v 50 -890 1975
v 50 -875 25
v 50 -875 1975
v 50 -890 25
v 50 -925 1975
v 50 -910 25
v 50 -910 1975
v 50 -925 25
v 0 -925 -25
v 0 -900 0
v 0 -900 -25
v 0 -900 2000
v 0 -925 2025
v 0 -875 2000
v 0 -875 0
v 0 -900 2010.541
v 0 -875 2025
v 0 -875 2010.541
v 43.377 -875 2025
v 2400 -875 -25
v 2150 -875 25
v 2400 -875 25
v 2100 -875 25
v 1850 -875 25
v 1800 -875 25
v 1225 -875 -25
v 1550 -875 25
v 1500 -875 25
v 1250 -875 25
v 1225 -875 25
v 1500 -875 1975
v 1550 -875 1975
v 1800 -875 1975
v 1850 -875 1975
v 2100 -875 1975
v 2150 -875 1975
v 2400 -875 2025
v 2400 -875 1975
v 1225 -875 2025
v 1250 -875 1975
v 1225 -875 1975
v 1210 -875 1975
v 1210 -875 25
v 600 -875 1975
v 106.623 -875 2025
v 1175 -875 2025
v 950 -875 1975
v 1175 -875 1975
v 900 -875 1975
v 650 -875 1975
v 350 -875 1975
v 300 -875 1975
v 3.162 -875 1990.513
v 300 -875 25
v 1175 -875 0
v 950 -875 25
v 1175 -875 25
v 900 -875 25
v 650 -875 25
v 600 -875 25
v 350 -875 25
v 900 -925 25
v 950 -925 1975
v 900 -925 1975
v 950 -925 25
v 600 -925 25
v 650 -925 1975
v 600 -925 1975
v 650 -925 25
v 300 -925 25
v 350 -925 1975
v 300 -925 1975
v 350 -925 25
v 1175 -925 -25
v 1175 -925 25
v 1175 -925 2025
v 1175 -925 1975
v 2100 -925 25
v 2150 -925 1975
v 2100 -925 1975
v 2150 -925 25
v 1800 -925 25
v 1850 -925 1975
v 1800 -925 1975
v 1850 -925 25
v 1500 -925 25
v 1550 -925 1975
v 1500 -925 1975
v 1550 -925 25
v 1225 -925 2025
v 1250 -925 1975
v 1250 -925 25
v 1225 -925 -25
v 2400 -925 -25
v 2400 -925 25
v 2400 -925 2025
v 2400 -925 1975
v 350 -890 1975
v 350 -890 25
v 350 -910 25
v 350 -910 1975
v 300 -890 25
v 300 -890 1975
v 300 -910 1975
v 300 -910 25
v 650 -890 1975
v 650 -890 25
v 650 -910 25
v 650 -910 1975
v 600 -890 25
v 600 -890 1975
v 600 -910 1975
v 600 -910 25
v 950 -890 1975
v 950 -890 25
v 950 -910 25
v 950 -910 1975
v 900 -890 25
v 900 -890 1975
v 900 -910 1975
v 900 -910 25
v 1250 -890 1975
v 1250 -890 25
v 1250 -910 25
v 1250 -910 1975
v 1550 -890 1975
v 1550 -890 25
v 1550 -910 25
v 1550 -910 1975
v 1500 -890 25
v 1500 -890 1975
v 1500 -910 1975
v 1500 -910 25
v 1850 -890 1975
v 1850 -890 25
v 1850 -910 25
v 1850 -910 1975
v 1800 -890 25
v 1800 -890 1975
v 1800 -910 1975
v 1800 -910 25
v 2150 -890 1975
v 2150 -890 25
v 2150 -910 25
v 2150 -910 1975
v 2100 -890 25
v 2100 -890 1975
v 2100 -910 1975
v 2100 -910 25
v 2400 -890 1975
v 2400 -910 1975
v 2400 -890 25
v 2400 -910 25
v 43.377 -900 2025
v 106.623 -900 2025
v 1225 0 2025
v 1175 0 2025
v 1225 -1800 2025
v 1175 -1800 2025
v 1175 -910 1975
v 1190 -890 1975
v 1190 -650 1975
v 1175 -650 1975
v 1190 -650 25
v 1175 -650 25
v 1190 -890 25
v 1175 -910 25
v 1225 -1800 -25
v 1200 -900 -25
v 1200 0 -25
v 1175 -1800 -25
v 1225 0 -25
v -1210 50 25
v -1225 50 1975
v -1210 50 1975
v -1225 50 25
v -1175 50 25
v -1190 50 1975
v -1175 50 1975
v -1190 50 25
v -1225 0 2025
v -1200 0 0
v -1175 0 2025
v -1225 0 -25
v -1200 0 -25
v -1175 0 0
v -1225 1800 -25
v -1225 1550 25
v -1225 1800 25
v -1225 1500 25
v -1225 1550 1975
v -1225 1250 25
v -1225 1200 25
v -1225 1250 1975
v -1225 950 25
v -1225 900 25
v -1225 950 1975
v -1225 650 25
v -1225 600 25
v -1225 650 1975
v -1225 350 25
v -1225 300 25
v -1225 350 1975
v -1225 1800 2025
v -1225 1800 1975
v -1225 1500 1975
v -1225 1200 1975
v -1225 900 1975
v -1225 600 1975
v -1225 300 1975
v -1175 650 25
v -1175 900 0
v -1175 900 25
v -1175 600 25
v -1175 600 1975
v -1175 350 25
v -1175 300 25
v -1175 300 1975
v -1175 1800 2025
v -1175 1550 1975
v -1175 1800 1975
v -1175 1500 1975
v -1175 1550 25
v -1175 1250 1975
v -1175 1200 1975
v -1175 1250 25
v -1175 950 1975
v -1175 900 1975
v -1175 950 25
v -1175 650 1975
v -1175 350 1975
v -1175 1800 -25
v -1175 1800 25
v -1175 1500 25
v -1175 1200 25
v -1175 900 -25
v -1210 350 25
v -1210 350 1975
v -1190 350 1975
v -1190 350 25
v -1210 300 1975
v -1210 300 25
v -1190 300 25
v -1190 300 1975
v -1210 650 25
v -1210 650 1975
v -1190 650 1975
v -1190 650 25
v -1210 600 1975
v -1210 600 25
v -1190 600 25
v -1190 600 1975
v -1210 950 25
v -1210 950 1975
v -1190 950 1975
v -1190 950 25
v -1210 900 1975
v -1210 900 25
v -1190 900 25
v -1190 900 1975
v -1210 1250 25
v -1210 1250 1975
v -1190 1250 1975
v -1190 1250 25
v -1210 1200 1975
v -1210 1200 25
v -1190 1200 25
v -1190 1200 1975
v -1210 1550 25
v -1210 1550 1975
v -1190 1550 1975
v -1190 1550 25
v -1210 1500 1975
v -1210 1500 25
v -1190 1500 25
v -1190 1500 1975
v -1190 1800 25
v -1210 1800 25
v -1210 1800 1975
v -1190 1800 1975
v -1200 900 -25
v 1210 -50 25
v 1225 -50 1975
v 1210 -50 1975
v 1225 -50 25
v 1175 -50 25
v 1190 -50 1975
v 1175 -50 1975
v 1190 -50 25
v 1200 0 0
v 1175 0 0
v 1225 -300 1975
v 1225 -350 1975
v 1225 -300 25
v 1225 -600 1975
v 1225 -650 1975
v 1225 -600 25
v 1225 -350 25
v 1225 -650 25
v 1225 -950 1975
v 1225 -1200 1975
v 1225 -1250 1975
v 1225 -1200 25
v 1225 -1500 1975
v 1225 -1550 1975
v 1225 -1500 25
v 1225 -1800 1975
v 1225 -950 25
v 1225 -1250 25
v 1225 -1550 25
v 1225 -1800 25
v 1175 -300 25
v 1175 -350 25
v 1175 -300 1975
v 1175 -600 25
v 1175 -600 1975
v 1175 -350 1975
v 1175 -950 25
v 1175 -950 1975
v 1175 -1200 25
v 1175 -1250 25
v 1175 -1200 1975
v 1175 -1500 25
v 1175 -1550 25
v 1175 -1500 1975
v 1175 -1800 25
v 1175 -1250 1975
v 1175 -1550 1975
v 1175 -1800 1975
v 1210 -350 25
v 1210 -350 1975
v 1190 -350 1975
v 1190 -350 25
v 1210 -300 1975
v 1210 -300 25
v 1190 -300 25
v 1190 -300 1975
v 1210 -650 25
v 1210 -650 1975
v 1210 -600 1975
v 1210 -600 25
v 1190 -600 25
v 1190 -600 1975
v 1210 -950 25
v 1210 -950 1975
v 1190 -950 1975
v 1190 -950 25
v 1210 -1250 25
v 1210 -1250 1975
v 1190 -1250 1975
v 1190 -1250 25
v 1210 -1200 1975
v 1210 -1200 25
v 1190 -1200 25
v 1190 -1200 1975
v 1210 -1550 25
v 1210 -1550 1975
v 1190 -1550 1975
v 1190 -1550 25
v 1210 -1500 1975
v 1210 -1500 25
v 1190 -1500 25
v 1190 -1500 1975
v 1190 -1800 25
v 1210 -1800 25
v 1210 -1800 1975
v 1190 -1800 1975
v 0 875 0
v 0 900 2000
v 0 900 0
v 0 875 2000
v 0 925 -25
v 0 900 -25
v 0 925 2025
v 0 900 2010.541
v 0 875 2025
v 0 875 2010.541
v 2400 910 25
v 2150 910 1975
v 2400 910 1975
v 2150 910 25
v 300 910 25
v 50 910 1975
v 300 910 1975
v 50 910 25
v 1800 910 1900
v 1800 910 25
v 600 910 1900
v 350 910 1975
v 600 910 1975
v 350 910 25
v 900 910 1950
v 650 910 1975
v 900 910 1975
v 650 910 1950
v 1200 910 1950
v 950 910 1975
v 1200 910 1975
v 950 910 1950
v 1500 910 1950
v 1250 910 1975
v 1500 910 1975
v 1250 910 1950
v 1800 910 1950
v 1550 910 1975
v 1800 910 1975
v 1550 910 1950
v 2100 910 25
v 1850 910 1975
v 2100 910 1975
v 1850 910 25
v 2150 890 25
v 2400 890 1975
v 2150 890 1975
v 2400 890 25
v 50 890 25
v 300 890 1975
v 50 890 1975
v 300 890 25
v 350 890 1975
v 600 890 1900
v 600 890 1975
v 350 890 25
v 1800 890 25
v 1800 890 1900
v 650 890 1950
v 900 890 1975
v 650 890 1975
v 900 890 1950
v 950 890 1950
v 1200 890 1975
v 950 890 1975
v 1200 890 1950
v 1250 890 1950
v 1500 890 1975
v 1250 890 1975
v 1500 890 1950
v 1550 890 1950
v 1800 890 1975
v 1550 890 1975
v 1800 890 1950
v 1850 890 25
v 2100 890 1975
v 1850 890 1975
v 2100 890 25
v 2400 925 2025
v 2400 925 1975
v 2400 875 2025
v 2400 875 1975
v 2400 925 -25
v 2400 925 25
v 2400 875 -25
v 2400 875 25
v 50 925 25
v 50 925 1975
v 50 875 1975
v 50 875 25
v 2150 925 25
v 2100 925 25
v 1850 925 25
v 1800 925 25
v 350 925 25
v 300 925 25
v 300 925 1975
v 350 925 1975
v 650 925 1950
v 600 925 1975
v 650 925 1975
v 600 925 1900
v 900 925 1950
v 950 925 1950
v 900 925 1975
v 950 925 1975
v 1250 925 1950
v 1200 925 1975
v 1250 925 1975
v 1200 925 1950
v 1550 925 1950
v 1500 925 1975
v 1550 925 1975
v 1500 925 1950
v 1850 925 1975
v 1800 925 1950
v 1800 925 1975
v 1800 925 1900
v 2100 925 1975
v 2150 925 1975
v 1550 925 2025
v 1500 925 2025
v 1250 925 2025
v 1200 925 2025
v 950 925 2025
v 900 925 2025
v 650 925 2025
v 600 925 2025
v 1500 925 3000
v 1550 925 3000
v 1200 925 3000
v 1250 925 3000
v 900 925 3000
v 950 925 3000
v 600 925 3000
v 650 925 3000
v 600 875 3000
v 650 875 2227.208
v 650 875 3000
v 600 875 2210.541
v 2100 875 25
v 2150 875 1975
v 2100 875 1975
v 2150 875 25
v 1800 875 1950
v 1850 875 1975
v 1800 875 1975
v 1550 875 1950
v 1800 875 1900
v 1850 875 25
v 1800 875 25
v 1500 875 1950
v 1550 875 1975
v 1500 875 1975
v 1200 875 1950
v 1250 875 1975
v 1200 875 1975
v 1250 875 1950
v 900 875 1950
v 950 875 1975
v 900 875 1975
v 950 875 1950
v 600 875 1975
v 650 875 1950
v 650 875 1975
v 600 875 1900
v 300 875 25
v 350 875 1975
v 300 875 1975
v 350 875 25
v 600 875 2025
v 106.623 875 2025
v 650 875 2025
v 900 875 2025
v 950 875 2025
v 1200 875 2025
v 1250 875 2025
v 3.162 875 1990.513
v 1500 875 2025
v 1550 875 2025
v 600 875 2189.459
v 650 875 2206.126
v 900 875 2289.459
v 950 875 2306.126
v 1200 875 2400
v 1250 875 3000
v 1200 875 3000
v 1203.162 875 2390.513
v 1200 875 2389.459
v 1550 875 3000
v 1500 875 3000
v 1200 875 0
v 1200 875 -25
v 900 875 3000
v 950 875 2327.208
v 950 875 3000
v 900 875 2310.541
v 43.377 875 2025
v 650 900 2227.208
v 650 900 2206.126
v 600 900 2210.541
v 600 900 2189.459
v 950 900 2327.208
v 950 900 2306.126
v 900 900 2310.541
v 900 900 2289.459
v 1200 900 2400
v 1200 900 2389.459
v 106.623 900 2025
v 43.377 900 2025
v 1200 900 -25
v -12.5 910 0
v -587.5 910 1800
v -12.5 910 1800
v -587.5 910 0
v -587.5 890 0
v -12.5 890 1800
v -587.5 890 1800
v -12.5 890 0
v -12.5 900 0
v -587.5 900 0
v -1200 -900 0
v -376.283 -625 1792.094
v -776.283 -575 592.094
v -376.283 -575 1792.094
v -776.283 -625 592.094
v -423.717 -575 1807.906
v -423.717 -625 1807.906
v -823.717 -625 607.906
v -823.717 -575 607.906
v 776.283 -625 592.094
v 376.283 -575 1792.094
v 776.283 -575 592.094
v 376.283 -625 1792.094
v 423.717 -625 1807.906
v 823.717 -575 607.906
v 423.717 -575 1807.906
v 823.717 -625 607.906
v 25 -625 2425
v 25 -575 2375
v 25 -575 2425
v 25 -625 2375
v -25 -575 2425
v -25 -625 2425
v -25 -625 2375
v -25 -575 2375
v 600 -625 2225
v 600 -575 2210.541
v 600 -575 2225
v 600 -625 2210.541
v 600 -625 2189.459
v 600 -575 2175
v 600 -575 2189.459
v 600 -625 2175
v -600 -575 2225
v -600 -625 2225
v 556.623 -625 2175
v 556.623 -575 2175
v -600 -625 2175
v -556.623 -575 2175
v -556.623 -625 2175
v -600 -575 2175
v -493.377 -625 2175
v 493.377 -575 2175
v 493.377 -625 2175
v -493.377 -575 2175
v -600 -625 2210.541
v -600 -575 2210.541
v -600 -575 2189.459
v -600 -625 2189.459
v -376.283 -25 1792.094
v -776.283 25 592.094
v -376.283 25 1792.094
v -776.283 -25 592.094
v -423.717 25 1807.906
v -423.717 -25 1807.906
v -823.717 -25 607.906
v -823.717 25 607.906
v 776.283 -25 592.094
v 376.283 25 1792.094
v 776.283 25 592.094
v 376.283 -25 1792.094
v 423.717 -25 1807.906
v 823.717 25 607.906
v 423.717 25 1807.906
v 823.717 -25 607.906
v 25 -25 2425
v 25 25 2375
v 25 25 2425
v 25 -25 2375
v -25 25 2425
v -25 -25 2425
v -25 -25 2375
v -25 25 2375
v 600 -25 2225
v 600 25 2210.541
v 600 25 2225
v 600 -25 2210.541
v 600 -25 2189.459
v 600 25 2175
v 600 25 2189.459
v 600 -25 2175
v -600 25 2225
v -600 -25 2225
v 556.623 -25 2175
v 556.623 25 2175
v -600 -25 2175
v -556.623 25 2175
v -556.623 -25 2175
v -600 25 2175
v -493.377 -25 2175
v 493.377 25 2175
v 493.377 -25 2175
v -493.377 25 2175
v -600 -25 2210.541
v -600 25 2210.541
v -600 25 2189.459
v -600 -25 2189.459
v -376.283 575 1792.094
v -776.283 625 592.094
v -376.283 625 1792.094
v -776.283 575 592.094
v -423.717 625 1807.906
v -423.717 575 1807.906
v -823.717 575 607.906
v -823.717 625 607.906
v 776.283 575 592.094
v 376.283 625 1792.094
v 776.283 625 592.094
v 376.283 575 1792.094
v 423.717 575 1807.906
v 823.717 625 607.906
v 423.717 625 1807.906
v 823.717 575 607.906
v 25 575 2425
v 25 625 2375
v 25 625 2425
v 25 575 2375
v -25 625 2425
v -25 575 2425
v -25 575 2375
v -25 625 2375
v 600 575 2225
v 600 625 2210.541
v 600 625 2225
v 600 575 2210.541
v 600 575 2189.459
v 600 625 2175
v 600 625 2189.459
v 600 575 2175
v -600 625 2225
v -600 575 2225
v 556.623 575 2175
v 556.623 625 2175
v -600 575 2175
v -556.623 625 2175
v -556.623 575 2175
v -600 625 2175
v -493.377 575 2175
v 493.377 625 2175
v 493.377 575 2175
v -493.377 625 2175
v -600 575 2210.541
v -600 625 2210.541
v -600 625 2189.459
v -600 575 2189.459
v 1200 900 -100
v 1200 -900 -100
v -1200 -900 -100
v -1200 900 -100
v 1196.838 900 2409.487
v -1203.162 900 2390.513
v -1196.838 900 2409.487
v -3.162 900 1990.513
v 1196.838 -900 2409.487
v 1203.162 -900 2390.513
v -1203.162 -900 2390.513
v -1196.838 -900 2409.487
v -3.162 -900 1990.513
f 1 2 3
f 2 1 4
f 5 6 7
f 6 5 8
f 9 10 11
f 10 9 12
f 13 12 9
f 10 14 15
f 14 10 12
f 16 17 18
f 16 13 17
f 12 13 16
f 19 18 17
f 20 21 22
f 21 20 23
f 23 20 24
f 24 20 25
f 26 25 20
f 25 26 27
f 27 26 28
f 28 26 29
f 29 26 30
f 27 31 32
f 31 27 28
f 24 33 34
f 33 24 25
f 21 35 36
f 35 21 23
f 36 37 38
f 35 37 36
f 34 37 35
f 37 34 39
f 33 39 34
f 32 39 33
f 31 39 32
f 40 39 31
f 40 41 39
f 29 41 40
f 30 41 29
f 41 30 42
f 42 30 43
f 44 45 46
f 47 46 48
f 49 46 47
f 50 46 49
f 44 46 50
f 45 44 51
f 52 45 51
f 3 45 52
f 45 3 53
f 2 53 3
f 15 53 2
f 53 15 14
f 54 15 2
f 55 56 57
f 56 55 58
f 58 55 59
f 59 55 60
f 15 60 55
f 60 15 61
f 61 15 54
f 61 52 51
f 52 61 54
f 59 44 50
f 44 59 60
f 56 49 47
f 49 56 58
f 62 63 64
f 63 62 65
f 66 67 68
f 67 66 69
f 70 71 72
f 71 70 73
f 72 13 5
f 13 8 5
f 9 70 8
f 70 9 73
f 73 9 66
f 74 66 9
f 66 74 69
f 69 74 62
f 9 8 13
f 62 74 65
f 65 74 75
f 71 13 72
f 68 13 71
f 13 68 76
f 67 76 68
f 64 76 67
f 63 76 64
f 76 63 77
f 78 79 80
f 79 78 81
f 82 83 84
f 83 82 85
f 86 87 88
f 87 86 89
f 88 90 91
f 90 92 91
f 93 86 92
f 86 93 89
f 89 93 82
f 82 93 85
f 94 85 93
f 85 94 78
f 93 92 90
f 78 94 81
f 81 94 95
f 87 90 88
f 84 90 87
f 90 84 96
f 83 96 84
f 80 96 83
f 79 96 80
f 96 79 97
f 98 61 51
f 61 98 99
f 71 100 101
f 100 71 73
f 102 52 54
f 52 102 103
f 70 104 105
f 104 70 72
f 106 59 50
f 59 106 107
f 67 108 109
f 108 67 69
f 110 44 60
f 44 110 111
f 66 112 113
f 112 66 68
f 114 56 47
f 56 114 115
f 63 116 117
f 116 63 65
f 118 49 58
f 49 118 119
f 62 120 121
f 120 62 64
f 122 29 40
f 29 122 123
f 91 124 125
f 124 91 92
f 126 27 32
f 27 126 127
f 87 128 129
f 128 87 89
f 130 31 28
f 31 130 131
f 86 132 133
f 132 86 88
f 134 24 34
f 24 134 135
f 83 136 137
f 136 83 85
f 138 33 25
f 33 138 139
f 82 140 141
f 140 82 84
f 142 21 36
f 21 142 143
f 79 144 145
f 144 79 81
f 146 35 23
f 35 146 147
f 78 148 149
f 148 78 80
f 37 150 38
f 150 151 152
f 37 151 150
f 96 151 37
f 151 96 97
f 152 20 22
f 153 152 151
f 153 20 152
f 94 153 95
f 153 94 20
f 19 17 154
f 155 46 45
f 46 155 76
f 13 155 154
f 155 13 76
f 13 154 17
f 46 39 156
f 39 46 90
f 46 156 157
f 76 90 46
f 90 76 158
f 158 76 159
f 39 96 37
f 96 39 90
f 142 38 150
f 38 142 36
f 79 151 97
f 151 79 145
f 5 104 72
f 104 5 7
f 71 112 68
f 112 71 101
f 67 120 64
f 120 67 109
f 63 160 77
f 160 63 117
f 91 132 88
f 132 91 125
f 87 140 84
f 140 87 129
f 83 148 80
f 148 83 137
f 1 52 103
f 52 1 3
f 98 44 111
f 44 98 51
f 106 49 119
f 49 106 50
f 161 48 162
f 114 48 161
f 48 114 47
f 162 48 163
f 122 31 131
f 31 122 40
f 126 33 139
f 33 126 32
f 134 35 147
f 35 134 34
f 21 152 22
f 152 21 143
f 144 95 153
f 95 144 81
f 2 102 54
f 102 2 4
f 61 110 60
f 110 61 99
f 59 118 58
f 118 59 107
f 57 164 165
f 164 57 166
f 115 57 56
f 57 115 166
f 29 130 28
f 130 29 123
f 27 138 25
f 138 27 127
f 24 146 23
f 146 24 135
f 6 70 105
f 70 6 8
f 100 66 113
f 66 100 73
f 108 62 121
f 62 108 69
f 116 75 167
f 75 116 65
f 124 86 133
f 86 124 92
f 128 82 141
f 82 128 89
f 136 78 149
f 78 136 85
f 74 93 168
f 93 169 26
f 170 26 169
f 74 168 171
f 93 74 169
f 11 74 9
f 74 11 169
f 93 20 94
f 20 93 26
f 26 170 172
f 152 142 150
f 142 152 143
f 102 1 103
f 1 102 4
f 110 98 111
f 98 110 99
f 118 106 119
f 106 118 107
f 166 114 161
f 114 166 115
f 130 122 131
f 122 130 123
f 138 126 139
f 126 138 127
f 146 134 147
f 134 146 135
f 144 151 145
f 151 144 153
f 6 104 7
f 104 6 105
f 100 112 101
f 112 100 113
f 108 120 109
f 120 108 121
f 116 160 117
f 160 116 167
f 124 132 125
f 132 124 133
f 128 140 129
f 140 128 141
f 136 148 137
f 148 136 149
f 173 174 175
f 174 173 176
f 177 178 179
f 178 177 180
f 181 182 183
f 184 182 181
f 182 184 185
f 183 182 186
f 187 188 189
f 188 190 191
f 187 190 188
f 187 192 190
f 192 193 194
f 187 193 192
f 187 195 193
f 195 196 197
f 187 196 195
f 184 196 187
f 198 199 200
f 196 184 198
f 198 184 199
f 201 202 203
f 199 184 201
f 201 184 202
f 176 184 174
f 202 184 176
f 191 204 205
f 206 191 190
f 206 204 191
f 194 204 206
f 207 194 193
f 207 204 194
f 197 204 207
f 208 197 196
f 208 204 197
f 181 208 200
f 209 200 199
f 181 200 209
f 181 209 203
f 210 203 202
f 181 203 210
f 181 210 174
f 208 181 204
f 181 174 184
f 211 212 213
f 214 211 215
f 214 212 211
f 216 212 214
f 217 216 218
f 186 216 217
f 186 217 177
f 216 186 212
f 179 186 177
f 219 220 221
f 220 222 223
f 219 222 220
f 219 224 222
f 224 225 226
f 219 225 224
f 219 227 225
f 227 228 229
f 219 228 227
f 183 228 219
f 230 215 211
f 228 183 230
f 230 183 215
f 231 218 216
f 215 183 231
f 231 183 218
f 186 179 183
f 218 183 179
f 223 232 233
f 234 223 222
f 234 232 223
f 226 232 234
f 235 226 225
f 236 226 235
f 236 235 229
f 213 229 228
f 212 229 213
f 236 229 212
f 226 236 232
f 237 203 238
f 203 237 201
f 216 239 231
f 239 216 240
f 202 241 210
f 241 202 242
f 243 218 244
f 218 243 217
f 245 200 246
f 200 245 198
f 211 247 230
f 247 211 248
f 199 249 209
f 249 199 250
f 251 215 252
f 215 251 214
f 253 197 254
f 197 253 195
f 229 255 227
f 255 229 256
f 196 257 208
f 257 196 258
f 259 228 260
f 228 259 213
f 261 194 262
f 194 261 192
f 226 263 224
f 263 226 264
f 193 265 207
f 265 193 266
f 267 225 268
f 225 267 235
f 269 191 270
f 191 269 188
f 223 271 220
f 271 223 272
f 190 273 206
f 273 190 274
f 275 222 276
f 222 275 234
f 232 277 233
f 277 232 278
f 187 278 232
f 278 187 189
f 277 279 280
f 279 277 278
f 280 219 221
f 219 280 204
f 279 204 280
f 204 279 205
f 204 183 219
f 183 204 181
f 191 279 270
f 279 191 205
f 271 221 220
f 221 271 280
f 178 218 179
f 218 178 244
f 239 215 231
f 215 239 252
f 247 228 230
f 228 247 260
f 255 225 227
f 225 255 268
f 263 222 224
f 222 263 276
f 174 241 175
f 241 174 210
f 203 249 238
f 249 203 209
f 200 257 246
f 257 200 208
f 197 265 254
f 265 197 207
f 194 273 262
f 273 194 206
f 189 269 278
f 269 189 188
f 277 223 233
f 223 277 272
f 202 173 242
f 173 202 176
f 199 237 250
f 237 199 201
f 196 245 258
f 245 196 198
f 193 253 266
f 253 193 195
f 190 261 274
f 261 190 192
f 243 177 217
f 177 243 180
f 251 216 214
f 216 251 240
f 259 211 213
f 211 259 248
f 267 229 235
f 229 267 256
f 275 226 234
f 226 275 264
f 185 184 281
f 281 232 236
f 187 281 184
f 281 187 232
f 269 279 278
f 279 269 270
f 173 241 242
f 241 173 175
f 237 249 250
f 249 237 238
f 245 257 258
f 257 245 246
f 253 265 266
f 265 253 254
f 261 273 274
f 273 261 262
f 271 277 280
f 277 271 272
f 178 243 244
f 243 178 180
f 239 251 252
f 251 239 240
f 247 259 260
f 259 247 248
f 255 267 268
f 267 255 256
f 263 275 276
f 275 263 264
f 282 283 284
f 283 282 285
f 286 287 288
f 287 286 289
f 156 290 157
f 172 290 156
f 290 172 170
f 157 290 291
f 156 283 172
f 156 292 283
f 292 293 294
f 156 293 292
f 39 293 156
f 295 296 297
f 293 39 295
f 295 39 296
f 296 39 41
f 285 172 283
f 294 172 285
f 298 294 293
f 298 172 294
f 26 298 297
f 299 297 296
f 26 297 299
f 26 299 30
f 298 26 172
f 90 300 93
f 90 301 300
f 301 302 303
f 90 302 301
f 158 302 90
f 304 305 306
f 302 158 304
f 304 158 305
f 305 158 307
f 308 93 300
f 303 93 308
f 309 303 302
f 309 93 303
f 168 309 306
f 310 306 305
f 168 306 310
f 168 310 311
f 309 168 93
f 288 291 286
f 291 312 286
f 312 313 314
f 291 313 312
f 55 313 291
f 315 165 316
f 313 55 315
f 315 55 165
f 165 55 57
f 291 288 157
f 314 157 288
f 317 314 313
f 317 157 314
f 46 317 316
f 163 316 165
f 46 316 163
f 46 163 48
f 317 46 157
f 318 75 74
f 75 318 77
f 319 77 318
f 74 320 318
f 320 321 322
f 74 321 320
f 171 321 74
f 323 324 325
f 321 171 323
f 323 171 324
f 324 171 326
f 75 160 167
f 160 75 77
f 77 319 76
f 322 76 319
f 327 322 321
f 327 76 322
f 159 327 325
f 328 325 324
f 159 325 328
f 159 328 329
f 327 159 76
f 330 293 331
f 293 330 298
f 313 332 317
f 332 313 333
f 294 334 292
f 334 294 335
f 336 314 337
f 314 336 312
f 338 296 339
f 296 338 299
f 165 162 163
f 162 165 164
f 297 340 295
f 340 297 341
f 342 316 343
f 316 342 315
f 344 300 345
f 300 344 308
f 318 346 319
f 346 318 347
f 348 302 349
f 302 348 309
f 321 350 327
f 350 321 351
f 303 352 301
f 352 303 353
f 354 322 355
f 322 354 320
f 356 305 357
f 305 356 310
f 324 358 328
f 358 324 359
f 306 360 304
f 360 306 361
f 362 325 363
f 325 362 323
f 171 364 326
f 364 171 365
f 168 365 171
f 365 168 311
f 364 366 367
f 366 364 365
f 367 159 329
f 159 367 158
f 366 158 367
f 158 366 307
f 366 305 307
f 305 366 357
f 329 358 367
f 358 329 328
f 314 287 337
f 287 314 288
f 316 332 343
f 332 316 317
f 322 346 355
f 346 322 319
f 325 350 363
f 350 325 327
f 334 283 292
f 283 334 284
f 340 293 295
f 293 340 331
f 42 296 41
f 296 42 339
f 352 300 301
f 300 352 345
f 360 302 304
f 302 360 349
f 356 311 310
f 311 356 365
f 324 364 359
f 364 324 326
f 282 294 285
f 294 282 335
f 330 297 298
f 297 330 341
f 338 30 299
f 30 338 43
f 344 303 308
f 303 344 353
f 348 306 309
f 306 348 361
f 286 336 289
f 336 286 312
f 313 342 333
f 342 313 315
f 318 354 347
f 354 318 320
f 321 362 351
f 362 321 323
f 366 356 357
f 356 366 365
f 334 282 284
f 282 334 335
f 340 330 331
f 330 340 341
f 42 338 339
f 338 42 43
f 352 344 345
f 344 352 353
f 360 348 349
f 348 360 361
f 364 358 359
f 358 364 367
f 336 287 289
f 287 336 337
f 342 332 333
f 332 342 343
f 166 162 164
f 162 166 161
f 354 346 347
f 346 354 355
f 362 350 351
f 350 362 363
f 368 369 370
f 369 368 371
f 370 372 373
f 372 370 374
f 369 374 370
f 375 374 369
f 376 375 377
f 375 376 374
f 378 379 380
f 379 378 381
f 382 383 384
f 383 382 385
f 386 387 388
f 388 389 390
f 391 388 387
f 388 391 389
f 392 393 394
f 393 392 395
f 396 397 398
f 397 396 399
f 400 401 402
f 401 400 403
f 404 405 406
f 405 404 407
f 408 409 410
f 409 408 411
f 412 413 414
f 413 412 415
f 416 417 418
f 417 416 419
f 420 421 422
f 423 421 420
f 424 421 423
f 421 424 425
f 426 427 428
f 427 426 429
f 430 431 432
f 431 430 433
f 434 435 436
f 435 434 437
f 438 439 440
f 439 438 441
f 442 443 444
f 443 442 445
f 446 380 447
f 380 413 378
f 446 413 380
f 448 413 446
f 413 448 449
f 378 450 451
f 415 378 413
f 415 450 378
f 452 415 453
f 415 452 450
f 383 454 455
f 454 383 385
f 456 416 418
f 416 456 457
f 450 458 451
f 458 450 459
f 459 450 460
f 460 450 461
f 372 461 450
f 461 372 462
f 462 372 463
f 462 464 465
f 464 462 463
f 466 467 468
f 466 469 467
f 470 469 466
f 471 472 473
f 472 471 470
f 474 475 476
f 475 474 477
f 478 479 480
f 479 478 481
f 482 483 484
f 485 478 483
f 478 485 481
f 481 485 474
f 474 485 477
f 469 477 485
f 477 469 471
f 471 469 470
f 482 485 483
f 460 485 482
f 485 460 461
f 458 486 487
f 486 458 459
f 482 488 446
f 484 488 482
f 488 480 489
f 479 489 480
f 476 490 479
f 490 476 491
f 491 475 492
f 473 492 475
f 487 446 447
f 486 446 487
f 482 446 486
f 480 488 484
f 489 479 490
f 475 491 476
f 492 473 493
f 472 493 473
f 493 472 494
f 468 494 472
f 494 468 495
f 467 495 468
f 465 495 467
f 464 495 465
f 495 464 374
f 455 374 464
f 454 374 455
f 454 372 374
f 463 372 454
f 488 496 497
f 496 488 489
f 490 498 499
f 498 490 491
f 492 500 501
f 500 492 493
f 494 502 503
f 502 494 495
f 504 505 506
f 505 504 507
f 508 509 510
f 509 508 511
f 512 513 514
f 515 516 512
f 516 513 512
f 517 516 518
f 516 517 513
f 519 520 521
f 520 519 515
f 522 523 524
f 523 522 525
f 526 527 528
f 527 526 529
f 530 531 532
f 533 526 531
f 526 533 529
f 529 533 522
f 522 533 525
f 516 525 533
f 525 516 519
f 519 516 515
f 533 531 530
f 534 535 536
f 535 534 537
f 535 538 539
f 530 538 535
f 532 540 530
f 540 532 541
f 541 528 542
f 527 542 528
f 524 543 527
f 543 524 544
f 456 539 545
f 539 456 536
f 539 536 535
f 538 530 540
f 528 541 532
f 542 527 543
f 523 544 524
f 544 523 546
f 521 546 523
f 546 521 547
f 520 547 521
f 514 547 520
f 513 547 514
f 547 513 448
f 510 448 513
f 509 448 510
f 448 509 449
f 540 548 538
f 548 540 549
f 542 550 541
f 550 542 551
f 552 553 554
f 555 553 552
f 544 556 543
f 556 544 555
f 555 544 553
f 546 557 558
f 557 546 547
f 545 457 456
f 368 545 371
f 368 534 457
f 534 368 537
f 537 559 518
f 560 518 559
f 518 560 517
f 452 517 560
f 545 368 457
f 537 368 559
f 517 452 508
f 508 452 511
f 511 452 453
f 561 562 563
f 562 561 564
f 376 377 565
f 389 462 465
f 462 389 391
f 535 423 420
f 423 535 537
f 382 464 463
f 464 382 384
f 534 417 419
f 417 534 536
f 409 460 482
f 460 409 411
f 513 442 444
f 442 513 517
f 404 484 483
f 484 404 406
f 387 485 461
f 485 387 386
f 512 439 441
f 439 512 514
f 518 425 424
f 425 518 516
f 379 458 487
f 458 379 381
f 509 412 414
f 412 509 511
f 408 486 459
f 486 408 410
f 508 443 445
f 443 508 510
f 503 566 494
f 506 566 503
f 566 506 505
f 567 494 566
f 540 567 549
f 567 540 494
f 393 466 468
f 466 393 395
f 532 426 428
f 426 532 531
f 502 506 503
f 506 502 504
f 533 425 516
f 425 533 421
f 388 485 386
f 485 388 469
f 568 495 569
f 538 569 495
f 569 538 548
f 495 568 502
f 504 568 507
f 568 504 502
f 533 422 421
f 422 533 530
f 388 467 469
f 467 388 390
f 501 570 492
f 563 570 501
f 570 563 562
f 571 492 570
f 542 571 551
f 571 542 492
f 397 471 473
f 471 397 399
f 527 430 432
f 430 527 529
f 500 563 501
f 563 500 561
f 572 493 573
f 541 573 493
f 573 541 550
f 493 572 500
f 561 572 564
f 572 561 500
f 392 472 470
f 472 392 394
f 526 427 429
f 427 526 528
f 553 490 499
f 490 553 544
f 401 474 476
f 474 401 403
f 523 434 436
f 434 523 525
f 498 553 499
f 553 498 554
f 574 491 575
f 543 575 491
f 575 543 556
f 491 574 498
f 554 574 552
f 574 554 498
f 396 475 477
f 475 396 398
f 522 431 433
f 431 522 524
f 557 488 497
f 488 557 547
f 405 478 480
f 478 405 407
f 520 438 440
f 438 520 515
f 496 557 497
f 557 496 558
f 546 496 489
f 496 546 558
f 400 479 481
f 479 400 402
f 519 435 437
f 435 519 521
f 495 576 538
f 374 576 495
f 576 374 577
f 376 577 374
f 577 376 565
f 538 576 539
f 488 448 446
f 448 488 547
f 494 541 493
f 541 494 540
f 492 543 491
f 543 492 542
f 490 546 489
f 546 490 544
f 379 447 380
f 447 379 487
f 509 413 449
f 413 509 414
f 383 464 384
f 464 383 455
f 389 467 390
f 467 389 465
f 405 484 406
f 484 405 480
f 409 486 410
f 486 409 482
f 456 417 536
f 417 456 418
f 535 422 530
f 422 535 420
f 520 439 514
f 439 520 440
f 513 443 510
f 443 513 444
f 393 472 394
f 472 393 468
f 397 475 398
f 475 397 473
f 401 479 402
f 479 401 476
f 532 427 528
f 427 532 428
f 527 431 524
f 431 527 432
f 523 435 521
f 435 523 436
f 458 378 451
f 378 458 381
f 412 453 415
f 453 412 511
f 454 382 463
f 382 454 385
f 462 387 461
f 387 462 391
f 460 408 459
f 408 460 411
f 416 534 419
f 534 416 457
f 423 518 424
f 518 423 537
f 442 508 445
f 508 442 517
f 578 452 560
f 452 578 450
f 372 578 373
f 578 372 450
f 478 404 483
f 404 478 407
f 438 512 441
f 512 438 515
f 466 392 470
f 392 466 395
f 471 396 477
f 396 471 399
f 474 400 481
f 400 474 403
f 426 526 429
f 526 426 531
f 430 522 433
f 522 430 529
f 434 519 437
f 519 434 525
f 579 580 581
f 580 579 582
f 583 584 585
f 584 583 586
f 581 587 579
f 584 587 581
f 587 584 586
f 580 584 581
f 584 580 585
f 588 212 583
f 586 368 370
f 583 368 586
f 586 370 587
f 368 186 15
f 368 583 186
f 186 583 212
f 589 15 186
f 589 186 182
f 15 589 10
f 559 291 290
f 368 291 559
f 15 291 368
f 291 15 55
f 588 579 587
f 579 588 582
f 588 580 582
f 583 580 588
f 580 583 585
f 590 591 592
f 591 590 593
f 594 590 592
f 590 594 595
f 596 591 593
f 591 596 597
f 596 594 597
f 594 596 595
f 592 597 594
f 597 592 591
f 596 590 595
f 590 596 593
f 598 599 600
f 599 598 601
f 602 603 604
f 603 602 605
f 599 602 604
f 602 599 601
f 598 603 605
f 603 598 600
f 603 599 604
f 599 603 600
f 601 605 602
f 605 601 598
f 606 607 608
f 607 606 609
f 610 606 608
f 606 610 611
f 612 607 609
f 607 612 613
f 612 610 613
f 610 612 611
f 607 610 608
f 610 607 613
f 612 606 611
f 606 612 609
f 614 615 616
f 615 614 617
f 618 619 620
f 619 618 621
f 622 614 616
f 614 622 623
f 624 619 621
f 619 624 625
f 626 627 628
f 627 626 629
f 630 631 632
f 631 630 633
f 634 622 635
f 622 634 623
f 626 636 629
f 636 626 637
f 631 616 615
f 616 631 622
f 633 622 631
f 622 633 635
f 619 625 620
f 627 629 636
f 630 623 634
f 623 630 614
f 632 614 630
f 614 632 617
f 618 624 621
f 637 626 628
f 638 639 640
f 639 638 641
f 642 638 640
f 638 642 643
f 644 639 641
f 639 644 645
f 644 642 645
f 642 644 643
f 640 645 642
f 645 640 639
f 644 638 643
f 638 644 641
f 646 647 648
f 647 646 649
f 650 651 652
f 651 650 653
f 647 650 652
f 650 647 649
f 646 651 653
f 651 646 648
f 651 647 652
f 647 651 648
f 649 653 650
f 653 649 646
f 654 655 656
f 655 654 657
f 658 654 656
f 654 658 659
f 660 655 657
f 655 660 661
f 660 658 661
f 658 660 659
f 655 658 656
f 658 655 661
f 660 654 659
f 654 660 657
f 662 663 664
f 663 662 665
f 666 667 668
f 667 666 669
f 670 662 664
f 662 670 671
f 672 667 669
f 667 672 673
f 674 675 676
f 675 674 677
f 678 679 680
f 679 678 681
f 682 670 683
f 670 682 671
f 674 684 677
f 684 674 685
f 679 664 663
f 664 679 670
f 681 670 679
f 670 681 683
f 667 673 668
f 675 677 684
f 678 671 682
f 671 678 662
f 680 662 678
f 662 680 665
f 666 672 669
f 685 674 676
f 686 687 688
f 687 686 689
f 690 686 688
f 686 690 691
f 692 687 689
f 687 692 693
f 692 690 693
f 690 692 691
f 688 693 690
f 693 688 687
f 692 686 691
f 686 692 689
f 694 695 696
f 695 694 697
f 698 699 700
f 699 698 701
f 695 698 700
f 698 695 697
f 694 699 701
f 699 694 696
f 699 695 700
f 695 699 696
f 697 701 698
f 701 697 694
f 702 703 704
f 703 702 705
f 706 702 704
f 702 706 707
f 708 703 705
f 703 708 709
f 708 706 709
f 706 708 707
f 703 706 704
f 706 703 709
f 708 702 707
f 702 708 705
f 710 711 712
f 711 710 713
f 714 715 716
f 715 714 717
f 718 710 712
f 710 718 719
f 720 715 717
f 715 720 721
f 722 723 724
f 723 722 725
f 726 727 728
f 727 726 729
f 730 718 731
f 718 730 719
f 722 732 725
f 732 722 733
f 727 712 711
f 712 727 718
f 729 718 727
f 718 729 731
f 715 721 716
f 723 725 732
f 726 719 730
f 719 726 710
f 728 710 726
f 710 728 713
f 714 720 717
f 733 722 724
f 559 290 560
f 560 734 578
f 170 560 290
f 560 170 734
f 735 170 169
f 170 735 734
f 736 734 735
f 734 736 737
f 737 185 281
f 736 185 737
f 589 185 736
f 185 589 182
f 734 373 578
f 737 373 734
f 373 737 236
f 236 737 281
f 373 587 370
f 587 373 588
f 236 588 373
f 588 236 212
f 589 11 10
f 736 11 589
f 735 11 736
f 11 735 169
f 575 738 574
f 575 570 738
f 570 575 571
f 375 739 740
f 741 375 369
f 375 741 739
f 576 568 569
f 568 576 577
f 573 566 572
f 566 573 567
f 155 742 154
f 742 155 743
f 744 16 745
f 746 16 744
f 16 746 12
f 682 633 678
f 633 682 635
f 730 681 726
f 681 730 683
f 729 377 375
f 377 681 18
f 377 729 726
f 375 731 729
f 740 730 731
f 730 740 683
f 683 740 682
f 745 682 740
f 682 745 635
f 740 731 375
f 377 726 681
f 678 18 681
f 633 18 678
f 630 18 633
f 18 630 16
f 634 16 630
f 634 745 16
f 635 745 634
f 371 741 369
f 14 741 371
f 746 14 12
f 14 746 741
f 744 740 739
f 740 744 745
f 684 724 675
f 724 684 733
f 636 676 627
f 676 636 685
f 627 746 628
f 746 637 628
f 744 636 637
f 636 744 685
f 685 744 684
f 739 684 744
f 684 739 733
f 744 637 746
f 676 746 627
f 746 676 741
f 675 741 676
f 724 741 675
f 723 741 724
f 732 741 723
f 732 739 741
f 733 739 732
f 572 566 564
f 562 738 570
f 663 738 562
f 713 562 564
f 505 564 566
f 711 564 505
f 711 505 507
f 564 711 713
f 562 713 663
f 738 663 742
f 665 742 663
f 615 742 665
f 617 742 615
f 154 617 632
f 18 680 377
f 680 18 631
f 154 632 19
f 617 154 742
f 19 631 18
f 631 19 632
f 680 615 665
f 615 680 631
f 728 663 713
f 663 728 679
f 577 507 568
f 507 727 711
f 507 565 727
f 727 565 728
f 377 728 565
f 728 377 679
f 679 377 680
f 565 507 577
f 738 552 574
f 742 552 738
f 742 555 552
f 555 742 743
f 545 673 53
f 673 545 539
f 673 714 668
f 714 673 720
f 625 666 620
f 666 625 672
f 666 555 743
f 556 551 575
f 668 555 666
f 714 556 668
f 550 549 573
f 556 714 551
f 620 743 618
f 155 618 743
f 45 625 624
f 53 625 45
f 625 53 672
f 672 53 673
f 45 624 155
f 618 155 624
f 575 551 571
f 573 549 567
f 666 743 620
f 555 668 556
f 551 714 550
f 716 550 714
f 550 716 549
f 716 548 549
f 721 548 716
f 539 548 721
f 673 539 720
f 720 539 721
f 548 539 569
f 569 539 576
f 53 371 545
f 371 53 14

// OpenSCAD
// Shed Parameters
shed_width = 2400;       // Overall width (mm)
shed_depth = 1800;       // Overall depth (mm)
wall_height = 2000;      // Wall height (mm)
roof_pitch = 4/12;       // Roof pitch (rise over run)
truss_spacing = 600;     // Spacing between roof trusses (mm)
panel_width = 300;       // Width of vertical wall panels (mm)
door_width = 1200;       // Total door width (double door, mm)
door_height = 1800;      // Door height (mm)
frame_thickness = 50;    // Thickness of frame members (mm)
panel_thickness = 20;    // Thickness of wall panels (mm)
hinge_width = 50;        // Width of door hinges (mm)
hinge_height = 100;      // Height of door hinges (mm)
floor_thickness = 100;   // Thickness of floor slab (mm)

// Calculated Parameters
roof_rise = (shed_width / 2) * roof_pitch;  // Roof rise from wall top to ridge
roof_height = wall_height + roof_rise;      // Total height to ridge
rafter_length = sqrt( (shed_width/2)^2 + roof_rise^2 );  // Length of each rafter
num_trusses = floor(shed_depth / truss_spacing) + 1;     // Number of trusses

$fn = 100;  // Smooth curves

// Module: Floor slab
module floor_slab(width, depth, thickness) {
    translate([0, 0, -thickness/2])
    cube([width, depth, thickness], center=true);
}

// Module: Wall frame (without door)
module wall_frame(width, height, depth, frame_thickness) {
    // Vertical studs
    for (x = [frame_thickness/2 : panel_width : width - frame_thickness/2]) {
        translate([x, 0, 0])
        cube([frame_thickness, depth, height], center=true);
    }
    // Top and bottom plates
    translate([width/2, 0, height/2])
    cube([width, depth, frame_thickness], center=true);
    translate([width/2, 0, -height/2])
    cube([width, depth, frame_thickness], center=true);
}

// Module: Front wall frame with door opening
module front_wall_frame(width, height, depth, frame_thickness, door_width, door_height) {
    // Vertical studs (excluding door area)
    // Left side of door
    for (x = [frame_thickness/2 : panel_width : (width - door_width)/2 - frame_thickness/2]) {
        translate([x, 0, 0])
        cube([frame_thickness, depth, height], center=true);
    }
    // Right side of door
    for (x = [(width + door_width)/2 + frame_thickness/2 : panel_width : width - frame_thickness/2]) {
        translate([x, 0, 0])
        cube([frame_thickness, depth, height], center=true);
    }
    // Studs above door
    door_top = door_height/2;
    for (x = [(width - door_width)/2 + frame_thickness/2 : panel_width : (width + door_width)/2 - frame_thickness/2]) {
        translate([x, 0, door_top + (height - door_top)/2])
        cube([frame_thickness, depth, height - door_top], center=true);
    }
    // Top and bottom plates
    translate([width/2, 0, height/2])
    cube([width, depth, frame_thickness], center=true);
    translate([width/2, 0, -height/2])
    cube([width, depth, frame_thickness], center=true);
    // Door header
    translate([width/2, 0, door_top + frame_thickness/2])
    cube([door_width, depth, frame_thickness], center=true);
}

// Module: Vertical wall panels
module wall_panels(width, height, depth, panel_width, panel_thickness) {
    for (x = [0 : panel_width : width - panel_width]) {
        translate([x + panel_width/2, 0, 0])
        cube([panel_width, depth, height], center=true);
    }
}

// Module: Roof truss
module roof_truss(width, roof_rise, depth, frame_thickness) {
    // Rafters
    rafter_width = frame_thickness;
    rafter_depth = depth;
    // Left rafter
    translate([-width/4, 0, wall_height/2 + roof_rise/2])
    rotate([0, atan2(roof_rise, width/2), 0])
    cube([rafter_width, rafter_depth, rafter_length], center=true);
    // Right rafter
    translate([width/4, 0, wall_height/2 + roof_rise/2])
    rotate([0, -atan2(roof_rise, width/2), 0])
    cube([rafter_width, rafter_depth, rafter_length], center=true);
    // Ridge beam
    translate([0, 0, wall_height + roof_rise])
    cube([frame_thickness, depth, frame_thickness], center=true);
    // Collar tie (for stability)
    translate([0, 0, wall_height + roof_rise/2])
    cube([width/2, depth, frame_thickness], center=true);
}

// Module: Double door with hinges
module door(width, height, depth, frame_thickness, hinge_width, hinge_height) {
    // Door panels
    door_panel_width = (width - frame_thickness)/2;
    // Left door
    translate([-door_panel_width/2 - frame_thickness/4, 0, 0])
    cube([door_panel_width, depth, height], center=true);
    // Right door
    translate([door_panel_width/2 + frame_thickness/4, 0, 0])
    cube([door_panel_width, depth, height], center=true);
    // Hinges on left door
    for (z = [-height/3, 0, height/3]) {
        translate([-door_panel_width/2 - frame_thickness/2, 0, z])
        cube([hinge_width, depth, hinge_height], center=true);
    }
    // Hinges on right door
    for (z = [-height/3, 0, height/3]) {
        translate([door_panel_width/2 + frame_thickness/2, 0, z])
        cube([hinge_width, depth, hinge_height], center=true);
    }
}

// Module: Complete shed assembly
module shed() {
    // Floor
    floor_slab(shed_width, shed_depth, floor_thickness);
    
    // Back wall
    translate([0, -shed_depth/2, wall_height/2])
    union() {
        wall_frame(shed_width, wall_height, frame_thickness, frame_thickness);
        wall_panels(shed_width, wall_height, panel_thickness, panel_width, panel_thickness);
    }
    
    // Left wall
    translate([-shed_width/2, 0, wall_height/2])
    rotate([0, 0, 90])
    union() {
        wall_frame(shed_depth, wall_height, frame_thickness, frame_thickness);
        wall_panels(shed_depth, wall_height, panel_thickness, panel_width, panel_thickness);
    }
    
    // Right wall
    translate([shed_width/2, 0, wall_height/2])
    rotate([0, 0, -90])
    union() {
        wall_frame(shed_depth, wall_height, frame_thickness, frame_thickness);
        wall_panels(shed_depth, wall_height, panel_thickness, panel_width, panel_thickness);
    }
    
    // Front wall
    translate([0, shed_depth/2, wall_height/2])
    union() {
        front_wall_frame(shed_width, wall_height, frame_thickness, frame_thickness, door_width, door_height);
        wall_panels(shed_width, wall_height, panel_thickness, panel_width, panel_thickness);
        // Door
        translate([0, 0, -wall_height/2 + door_height/2])
        door(door_width, door_height, panel_thickness, frame_thickness, hinge_width, hinge_height);
    }
    
    // Roof trusses
    for (y = [-shed_depth/2 + truss_spacing/2 : truss_spacing : shed_depth/2 - truss_spacing/2]) {
        translate([0, y, 0])
        roof_truss(shed_width, roof_rise, frame_thickness, frame_thickness);
    }
    
    // Roof panels
    // Left roof panel
    translate([-shed_width/4, 0, wall_height + roof_rise/2])
    rotate([0, atan2(roof_rise, shed_width/2), 0])
    cube([rafter_length, shed_depth, panel_thickness], center=true);
    // Right roof panel
    translate([shed_width/4, 0, wall_height + roof_rise/2])
    rotate([0, -atan2(roof_rise, shed_width/2), 0])
    cube([rafter_length, shed_depth, panel_thickness], center=true);
}

// Render the shed
shed();
